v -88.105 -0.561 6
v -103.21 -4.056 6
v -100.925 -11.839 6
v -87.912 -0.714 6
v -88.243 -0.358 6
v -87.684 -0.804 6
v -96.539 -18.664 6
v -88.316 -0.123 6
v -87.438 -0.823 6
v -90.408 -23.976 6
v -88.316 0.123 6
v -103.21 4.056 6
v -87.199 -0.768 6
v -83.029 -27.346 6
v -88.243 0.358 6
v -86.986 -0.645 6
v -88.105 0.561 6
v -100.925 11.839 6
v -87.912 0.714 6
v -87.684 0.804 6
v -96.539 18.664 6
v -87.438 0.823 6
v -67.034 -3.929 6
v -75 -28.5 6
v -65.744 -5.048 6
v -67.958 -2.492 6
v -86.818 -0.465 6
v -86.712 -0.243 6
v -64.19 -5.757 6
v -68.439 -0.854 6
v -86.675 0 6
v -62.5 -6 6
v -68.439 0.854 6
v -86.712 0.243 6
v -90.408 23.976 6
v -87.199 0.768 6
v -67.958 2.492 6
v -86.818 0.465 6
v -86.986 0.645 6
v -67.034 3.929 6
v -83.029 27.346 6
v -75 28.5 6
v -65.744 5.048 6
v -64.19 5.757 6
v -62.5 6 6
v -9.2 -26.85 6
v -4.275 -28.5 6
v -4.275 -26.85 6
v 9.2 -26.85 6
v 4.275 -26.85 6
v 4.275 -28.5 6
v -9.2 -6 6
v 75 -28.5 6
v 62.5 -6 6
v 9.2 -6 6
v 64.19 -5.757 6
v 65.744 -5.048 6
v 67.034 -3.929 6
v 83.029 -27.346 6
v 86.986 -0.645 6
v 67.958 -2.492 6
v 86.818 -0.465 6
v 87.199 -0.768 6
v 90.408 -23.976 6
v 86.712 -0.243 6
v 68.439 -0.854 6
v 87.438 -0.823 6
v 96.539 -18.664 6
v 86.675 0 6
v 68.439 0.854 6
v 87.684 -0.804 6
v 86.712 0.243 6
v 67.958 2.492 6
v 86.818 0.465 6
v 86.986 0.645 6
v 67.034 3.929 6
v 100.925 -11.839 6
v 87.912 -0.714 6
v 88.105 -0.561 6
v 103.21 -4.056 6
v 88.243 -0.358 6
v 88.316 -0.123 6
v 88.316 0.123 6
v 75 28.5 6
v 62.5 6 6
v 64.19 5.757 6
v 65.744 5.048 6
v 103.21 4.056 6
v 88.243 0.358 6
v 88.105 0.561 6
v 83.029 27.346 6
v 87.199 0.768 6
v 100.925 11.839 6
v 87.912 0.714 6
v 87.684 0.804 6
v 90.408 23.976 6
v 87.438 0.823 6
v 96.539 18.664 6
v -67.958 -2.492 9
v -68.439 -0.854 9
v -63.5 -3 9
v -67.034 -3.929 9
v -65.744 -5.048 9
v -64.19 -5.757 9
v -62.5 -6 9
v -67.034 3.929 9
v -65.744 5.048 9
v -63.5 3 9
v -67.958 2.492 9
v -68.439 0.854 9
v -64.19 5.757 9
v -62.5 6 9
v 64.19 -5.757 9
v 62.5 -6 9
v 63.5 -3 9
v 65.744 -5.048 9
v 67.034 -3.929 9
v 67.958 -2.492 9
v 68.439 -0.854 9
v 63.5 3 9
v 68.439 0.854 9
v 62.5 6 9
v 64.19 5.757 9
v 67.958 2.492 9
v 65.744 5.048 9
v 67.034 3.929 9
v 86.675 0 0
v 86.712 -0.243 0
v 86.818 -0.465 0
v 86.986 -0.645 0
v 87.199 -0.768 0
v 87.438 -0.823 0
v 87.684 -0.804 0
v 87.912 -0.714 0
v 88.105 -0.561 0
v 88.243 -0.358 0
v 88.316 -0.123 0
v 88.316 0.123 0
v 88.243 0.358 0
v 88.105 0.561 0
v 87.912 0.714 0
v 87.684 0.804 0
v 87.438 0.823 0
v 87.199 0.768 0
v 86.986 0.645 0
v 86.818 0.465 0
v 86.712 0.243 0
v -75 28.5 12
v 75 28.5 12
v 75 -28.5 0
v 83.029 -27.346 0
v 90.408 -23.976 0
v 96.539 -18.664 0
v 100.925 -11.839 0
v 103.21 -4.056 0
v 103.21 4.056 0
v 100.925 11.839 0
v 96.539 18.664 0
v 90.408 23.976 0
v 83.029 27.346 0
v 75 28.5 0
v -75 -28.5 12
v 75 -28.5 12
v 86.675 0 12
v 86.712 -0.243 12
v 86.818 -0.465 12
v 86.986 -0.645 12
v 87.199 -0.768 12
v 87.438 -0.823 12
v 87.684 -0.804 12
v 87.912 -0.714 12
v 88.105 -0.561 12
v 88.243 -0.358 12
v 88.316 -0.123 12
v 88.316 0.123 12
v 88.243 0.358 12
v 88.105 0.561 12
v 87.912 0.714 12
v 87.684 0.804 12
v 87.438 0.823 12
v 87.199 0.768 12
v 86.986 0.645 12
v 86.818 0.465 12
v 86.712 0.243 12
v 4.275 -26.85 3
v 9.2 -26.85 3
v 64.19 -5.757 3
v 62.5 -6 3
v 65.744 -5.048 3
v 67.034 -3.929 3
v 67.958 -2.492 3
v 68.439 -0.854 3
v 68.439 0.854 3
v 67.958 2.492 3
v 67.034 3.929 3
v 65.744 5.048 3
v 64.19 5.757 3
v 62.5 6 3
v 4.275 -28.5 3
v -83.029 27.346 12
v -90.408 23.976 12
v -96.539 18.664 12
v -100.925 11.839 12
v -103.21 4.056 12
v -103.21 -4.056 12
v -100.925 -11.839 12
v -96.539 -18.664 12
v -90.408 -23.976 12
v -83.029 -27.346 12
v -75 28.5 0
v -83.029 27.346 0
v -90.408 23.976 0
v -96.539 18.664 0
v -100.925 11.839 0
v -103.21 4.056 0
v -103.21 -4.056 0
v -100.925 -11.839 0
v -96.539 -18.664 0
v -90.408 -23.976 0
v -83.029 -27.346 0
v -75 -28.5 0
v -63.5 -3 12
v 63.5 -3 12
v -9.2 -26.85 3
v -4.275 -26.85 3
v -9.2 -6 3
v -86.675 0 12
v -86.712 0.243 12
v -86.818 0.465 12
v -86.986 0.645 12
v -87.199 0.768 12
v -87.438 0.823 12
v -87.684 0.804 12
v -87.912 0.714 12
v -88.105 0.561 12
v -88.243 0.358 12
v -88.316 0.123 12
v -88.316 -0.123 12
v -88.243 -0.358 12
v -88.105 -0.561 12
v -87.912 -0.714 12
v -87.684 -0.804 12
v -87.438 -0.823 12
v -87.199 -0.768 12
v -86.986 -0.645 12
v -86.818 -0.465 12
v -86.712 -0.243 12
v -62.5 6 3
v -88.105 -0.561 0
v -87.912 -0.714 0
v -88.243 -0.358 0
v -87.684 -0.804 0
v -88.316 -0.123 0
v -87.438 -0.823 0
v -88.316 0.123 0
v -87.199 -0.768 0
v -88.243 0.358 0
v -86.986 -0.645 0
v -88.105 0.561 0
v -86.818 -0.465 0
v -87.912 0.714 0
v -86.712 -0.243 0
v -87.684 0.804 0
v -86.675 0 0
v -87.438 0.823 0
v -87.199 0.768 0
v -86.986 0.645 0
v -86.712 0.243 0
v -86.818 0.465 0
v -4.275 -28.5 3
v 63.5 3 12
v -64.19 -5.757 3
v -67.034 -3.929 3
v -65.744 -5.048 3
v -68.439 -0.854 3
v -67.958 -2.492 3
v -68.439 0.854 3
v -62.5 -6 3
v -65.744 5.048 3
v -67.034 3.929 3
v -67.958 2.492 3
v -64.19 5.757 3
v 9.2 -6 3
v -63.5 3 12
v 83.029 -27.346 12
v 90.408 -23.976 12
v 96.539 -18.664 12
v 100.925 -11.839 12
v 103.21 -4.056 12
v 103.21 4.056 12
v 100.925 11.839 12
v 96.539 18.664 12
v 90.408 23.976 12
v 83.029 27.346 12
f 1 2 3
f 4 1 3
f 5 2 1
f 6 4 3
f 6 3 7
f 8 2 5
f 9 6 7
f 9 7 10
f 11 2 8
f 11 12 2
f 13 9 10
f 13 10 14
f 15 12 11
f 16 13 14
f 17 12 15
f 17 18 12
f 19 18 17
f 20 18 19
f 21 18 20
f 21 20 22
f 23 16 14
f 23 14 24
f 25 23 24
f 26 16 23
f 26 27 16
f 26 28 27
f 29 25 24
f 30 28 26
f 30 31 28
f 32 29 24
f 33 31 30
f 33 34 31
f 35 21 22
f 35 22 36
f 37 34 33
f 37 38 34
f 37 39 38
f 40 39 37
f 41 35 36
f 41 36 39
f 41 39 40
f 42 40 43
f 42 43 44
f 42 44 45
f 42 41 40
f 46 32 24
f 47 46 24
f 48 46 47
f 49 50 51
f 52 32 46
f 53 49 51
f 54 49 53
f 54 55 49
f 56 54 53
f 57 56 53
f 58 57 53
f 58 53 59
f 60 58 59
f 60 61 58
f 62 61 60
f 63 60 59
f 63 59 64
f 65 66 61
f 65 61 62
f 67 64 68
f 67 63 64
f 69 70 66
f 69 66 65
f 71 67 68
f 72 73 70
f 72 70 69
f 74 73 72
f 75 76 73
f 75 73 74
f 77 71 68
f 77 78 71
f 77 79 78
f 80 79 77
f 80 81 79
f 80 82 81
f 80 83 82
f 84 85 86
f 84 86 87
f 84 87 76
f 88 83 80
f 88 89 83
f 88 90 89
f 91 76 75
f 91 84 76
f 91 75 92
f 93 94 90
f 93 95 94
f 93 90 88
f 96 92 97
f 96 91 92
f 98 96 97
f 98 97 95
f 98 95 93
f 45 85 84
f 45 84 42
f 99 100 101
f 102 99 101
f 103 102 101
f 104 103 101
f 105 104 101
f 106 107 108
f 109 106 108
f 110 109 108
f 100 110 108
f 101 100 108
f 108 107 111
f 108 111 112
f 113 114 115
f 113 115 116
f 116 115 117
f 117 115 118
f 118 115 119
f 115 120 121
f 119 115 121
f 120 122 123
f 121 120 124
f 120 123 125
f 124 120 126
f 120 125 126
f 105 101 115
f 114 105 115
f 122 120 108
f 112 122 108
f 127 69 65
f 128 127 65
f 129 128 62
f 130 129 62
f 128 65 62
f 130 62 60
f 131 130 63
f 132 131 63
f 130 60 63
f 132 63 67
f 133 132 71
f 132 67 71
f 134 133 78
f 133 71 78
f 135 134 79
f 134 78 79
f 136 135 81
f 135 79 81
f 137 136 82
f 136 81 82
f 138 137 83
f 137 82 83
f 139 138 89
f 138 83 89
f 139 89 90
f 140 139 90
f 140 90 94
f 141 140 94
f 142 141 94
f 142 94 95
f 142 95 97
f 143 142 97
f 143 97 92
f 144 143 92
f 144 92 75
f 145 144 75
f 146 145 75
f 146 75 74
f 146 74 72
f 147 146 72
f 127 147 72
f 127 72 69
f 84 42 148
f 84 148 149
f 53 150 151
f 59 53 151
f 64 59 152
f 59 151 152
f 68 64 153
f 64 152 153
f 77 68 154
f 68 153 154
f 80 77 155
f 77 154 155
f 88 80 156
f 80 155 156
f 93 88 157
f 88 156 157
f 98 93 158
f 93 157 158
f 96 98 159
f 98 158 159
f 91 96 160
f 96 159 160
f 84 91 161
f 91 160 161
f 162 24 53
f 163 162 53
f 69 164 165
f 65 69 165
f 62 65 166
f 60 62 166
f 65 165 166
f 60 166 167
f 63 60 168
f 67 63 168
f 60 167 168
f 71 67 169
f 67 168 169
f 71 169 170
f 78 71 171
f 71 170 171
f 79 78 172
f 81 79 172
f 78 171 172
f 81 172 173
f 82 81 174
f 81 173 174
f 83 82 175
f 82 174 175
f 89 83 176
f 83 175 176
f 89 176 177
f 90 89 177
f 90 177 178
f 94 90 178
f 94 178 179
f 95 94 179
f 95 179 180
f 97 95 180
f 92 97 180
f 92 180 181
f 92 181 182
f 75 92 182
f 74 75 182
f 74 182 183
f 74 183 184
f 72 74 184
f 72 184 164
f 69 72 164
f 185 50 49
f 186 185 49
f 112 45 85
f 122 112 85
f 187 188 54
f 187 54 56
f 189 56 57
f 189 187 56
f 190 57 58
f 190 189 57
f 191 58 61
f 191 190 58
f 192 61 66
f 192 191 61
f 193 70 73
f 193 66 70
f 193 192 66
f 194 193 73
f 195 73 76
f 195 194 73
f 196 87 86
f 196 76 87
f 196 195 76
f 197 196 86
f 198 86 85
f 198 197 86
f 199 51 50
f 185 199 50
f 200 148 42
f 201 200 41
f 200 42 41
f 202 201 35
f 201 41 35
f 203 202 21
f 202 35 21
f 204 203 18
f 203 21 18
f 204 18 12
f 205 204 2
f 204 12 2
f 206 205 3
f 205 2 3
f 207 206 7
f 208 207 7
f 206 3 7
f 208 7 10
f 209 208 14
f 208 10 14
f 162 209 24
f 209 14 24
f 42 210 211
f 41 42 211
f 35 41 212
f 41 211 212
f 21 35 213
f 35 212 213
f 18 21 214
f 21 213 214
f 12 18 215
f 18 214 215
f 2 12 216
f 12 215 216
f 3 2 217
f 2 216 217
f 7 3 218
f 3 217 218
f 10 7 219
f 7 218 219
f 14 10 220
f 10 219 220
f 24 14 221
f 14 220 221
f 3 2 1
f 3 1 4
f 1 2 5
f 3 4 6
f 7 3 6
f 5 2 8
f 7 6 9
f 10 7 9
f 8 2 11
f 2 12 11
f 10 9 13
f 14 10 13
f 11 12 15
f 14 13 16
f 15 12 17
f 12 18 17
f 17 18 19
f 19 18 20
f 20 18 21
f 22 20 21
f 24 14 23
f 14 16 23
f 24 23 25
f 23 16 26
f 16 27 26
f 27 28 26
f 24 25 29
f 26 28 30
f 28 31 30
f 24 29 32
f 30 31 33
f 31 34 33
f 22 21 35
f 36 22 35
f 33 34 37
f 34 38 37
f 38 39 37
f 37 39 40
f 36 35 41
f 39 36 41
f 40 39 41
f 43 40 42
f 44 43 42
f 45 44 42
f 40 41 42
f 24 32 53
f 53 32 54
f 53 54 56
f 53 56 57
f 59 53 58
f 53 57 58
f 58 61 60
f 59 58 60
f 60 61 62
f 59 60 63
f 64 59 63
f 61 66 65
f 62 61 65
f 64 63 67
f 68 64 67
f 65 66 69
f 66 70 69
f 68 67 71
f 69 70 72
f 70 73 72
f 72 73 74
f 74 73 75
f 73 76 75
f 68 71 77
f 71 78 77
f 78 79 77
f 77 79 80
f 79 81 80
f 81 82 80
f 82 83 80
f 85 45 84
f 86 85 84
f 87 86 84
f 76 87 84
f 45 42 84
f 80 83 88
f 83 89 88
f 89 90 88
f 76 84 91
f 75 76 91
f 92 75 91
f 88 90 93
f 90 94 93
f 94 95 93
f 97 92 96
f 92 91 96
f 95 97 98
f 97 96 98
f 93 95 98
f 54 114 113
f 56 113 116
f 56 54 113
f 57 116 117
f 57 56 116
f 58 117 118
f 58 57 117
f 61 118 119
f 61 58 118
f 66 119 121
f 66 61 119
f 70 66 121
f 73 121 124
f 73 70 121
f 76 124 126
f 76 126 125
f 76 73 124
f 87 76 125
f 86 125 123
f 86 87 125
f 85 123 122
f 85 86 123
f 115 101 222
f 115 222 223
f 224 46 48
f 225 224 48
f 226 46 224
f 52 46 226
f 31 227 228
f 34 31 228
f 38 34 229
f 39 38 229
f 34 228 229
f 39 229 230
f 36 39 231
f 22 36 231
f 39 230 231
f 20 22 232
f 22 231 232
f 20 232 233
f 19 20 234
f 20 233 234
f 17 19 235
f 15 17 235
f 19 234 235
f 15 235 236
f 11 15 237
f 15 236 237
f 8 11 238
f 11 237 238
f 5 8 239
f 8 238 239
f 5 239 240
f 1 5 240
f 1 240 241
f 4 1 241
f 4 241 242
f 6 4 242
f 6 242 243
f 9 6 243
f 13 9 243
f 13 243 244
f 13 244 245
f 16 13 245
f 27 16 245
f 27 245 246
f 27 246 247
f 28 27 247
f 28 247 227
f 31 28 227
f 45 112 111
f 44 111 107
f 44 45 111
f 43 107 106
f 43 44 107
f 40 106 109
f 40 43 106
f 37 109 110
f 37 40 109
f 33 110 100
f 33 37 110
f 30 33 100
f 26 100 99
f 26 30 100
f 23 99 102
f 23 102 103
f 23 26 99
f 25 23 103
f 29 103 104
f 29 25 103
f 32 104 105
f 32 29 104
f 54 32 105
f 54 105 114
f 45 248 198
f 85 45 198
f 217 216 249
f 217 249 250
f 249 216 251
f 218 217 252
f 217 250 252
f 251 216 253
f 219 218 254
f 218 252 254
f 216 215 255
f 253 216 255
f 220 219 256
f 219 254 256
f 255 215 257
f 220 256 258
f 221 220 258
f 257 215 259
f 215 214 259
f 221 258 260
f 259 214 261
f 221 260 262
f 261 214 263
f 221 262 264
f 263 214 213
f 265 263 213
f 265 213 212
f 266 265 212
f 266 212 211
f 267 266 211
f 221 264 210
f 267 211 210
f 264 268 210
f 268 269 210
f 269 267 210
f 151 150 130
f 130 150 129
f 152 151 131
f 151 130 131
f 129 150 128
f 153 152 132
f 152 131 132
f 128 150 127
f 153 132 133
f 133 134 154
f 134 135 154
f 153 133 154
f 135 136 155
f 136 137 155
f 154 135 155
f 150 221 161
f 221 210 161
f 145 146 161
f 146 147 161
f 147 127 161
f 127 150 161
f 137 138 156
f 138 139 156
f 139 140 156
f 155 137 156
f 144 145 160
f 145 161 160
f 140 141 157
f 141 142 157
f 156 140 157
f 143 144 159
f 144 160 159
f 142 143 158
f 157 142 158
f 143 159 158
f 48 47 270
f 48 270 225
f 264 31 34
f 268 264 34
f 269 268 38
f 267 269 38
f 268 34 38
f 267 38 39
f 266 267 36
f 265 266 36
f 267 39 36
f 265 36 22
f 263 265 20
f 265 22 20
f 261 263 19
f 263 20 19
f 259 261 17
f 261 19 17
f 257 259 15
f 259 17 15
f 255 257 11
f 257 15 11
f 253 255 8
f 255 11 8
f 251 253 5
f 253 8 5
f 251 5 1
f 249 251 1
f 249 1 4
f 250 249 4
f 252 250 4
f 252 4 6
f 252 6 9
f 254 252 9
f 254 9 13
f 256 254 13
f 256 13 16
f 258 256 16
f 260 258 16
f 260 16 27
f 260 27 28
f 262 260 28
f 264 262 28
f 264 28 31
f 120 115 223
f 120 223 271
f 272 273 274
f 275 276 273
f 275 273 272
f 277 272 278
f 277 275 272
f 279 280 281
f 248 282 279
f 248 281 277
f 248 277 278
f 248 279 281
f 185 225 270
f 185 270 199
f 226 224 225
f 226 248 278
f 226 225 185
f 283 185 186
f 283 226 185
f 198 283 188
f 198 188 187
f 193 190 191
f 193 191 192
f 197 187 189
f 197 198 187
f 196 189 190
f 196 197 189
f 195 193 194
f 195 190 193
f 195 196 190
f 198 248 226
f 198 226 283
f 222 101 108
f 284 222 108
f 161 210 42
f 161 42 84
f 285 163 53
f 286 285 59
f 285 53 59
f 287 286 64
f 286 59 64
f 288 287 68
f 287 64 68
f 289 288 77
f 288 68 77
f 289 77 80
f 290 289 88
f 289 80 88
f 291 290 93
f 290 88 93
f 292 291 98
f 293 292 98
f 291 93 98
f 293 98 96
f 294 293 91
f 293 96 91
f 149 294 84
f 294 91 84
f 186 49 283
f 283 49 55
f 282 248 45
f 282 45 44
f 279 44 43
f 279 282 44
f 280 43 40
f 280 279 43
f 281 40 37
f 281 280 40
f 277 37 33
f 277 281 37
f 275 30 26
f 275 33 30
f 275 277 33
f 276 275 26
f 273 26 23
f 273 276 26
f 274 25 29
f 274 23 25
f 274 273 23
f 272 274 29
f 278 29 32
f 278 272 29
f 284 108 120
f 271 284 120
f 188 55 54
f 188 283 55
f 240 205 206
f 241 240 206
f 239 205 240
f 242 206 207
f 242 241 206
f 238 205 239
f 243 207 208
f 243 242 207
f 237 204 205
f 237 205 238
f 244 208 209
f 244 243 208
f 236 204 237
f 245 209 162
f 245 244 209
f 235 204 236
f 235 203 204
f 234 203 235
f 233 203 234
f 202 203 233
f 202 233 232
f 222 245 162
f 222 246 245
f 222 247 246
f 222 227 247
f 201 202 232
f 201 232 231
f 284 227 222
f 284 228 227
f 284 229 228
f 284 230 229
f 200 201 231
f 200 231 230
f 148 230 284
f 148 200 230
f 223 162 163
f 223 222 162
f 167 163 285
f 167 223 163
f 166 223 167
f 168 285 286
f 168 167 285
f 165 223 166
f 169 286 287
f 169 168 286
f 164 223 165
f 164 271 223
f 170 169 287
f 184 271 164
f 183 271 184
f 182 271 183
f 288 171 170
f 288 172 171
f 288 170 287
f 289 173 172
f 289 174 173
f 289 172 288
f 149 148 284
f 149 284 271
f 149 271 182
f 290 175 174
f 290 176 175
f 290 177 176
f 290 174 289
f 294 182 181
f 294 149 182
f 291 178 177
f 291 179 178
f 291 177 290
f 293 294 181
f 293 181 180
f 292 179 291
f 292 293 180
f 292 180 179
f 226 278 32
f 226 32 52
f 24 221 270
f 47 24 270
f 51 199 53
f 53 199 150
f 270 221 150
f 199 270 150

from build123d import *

# Parameters (mm, degrees)
BOX_BOTTOM_HALF_0_W     = 209
BOX_BOTTOM_HALF_0_H     = 59
BOX_BOTTOM_HALF_0_DEPTH = 7
PAD_DEPTH               = 6
POCKET_DEPTH            = 3
SKETCH002_W             = 18.4
SKETCH002_H             = 20.85
POCKET001_DEPTH         = 3
SKETCH003_W             = 8.55
SKETCH003_H             = 1.65
POCKET002_DEPTH         = 3
PAD001_DEPTH            = 3
SKETCH005_W             = 127
SKETCH005_H             = 6
PAD002_DEPTH            = 3
SKETCH006_R             = 0.825
POCKET003_DEPTH         = 442.080062
POLARPATTERN_COUNT      = 2


with BuildPart() as box_bottom_half_0_body:
    # box_bottom_half_0 → box_bottom_half_0 (new body)
    with BuildSketch(Plane(origin=(-104.5, -29.5, -1), x_dir=(1, 0, 0), z_dir=(0, 0, 1))):
        with Locations((104.5, 29.5)):
            Rectangle(BOX_BOTTOM_HALF_0_W, BOX_BOTTOM_HALF_0_H)
    extrude(amount=BOX_BOTTOM_HALF_0_DEPTH)


with BuildPart() as body:
    # Sketch → Pad (new body)
    with BuildSketch(Plane.XY):
        with BuildLine():
            ThreePointArc((-75, 28.5), (-103.5, 0), (-75, -28.5))
            Line((-75, -28.5), (75, -28.5))
            ThreePointArc((75, -28.5), (103.5, 0), (75, 28.5))
            Line((-75, 28.5), (75, 28.5))
        make_face()
    extrude(amount=PAD_DEPTH)

    # Sketch001 (on Face6 of Pad) → Pocket (cut)
    with BuildSketch(Plane.XY.offset(6)):
        with BuildLine():
            ThreePointArc((-62.5, 6), (-68.5, 0), (-62.5, -6))
            Line((-62.5, -6), (62.5, -6))
            ThreePointArc((62.5, -6), (68.5, 0), (62.5, 6))
            Line((-62.5, 6), (62.5, 6))
        make_face()
    extrude(amount=-POCKET_DEPTH, mode=Mode.SUBTRACT)

    # Sketch002 (on Face5 of Pocket) → Pocket001 (cut)
    with BuildSketch(Plane.XY.offset(6)):
        with Locations((0, -16.425)):
            Rectangle(SKETCH002_W, SKETCH002_H)
    extrude(amount=-POCKET001_DEPTH, mode=Mode.SUBTRACT)

    # Sketch003 (on Face5 of Pocket001) → Pocket002 (cut)
    with BuildSketch(Plane.XY.offset(6)):
        with Locations((0, -27.675)):
            Rectangle(SKETCH003_W, SKETCH003_H)
    extrude(amount=-POCKET002_DEPTH, mode=Mode.SUBTRACT)

    # Sketch004 (on Face5 of Pocket002) → Pad001 (join)
    with BuildSketch(Plane.XY.offset(6)):
        with BuildLine():
            ThreePointArc((-75, 28.5), (-103.5, 0), (-75, -28.5))
            Line((-75, -28.5), (75, -28.5))
            ThreePointArc((75, -28.5), (103.5, 0), (75, 28.5))
            Line((-75, 28.5), (75, 28.5))
        make_face()
        with BuildLine():
            ThreePointArc((-62.5, 6), (-68.5, 0), (-62.5, -6))
            Line((-62.5, -6), (62.5, -6))
            ThreePointArc((62.5, -6), (68.5, 0), (62.5, 6))
            Line((-62.5, 6), (62.5, 6))
        make_face(mode=Mode.SUBTRACT)
    extrude(amount=PAD001_DEPTH)

    # Sketch005 (on Face12 of Pad001) → Pad002 (join)
    with BuildSketch(Plane.XY.offset(9)):
        with BuildLine():
            ThreePointArc((-75, 28.5), (-103.5, 0), (-75, -28.5))
            Line((-75, -28.5), (75, -28.5))
            ThreePointArc((75, -28.5), (103.5, 0), (75, 28.5))
            Line((-75, 28.5), (75, 28.5))
        make_face()
        Rectangle(SKETCH005_W, SKETCH005_H, mode=Mode.SUBTRACT)
    extrude(amount=PAD002_DEPTH)

    # Sketch006 (on Face20 of Pad002) → Pocket003 (cut, through all)
    with BuildSketch(Plane.XY.offset(12)):
        with Locations((-87.5, 0)):
            Circle(SKETCH006_R)
    pocket003 = extrude(amount=-POCKET003_DEPTH, mode=Mode.SUBTRACT)

    # PolarPattern: Pocket003 ×2 about axis
    polarpattern_axis = Axis((0, 0, 12), (0, 0, 1))
    for i in range(1, POLARPATTERN_COUNT):
        add(pocket003.rotate(polarpattern_axis, i * 360 / POLARPATTERN_COUNT), mode=Mode.SUBTRACT)


with BuildPart() as bottom_half_0_body:
    # bottom_half_0 base: copy of Body
    add(body.part)

    # bottom_half_0: intersect box_bottom_half_0 body
    add(box_bottom_half_0_body.part, mode=Mode.INTERSECT)


with BuildPart() as top_half_0_body:
    # top_half_0 base: copy of Body
    add(body.part)

    # top_half_0: cut box_bottom_half_0 body
    add(box_bottom_half_0_body.part, mode=Mode.SUBTRACT)


solid = Compound([bottom_half_0_body.part, top_half_0_body.part])
